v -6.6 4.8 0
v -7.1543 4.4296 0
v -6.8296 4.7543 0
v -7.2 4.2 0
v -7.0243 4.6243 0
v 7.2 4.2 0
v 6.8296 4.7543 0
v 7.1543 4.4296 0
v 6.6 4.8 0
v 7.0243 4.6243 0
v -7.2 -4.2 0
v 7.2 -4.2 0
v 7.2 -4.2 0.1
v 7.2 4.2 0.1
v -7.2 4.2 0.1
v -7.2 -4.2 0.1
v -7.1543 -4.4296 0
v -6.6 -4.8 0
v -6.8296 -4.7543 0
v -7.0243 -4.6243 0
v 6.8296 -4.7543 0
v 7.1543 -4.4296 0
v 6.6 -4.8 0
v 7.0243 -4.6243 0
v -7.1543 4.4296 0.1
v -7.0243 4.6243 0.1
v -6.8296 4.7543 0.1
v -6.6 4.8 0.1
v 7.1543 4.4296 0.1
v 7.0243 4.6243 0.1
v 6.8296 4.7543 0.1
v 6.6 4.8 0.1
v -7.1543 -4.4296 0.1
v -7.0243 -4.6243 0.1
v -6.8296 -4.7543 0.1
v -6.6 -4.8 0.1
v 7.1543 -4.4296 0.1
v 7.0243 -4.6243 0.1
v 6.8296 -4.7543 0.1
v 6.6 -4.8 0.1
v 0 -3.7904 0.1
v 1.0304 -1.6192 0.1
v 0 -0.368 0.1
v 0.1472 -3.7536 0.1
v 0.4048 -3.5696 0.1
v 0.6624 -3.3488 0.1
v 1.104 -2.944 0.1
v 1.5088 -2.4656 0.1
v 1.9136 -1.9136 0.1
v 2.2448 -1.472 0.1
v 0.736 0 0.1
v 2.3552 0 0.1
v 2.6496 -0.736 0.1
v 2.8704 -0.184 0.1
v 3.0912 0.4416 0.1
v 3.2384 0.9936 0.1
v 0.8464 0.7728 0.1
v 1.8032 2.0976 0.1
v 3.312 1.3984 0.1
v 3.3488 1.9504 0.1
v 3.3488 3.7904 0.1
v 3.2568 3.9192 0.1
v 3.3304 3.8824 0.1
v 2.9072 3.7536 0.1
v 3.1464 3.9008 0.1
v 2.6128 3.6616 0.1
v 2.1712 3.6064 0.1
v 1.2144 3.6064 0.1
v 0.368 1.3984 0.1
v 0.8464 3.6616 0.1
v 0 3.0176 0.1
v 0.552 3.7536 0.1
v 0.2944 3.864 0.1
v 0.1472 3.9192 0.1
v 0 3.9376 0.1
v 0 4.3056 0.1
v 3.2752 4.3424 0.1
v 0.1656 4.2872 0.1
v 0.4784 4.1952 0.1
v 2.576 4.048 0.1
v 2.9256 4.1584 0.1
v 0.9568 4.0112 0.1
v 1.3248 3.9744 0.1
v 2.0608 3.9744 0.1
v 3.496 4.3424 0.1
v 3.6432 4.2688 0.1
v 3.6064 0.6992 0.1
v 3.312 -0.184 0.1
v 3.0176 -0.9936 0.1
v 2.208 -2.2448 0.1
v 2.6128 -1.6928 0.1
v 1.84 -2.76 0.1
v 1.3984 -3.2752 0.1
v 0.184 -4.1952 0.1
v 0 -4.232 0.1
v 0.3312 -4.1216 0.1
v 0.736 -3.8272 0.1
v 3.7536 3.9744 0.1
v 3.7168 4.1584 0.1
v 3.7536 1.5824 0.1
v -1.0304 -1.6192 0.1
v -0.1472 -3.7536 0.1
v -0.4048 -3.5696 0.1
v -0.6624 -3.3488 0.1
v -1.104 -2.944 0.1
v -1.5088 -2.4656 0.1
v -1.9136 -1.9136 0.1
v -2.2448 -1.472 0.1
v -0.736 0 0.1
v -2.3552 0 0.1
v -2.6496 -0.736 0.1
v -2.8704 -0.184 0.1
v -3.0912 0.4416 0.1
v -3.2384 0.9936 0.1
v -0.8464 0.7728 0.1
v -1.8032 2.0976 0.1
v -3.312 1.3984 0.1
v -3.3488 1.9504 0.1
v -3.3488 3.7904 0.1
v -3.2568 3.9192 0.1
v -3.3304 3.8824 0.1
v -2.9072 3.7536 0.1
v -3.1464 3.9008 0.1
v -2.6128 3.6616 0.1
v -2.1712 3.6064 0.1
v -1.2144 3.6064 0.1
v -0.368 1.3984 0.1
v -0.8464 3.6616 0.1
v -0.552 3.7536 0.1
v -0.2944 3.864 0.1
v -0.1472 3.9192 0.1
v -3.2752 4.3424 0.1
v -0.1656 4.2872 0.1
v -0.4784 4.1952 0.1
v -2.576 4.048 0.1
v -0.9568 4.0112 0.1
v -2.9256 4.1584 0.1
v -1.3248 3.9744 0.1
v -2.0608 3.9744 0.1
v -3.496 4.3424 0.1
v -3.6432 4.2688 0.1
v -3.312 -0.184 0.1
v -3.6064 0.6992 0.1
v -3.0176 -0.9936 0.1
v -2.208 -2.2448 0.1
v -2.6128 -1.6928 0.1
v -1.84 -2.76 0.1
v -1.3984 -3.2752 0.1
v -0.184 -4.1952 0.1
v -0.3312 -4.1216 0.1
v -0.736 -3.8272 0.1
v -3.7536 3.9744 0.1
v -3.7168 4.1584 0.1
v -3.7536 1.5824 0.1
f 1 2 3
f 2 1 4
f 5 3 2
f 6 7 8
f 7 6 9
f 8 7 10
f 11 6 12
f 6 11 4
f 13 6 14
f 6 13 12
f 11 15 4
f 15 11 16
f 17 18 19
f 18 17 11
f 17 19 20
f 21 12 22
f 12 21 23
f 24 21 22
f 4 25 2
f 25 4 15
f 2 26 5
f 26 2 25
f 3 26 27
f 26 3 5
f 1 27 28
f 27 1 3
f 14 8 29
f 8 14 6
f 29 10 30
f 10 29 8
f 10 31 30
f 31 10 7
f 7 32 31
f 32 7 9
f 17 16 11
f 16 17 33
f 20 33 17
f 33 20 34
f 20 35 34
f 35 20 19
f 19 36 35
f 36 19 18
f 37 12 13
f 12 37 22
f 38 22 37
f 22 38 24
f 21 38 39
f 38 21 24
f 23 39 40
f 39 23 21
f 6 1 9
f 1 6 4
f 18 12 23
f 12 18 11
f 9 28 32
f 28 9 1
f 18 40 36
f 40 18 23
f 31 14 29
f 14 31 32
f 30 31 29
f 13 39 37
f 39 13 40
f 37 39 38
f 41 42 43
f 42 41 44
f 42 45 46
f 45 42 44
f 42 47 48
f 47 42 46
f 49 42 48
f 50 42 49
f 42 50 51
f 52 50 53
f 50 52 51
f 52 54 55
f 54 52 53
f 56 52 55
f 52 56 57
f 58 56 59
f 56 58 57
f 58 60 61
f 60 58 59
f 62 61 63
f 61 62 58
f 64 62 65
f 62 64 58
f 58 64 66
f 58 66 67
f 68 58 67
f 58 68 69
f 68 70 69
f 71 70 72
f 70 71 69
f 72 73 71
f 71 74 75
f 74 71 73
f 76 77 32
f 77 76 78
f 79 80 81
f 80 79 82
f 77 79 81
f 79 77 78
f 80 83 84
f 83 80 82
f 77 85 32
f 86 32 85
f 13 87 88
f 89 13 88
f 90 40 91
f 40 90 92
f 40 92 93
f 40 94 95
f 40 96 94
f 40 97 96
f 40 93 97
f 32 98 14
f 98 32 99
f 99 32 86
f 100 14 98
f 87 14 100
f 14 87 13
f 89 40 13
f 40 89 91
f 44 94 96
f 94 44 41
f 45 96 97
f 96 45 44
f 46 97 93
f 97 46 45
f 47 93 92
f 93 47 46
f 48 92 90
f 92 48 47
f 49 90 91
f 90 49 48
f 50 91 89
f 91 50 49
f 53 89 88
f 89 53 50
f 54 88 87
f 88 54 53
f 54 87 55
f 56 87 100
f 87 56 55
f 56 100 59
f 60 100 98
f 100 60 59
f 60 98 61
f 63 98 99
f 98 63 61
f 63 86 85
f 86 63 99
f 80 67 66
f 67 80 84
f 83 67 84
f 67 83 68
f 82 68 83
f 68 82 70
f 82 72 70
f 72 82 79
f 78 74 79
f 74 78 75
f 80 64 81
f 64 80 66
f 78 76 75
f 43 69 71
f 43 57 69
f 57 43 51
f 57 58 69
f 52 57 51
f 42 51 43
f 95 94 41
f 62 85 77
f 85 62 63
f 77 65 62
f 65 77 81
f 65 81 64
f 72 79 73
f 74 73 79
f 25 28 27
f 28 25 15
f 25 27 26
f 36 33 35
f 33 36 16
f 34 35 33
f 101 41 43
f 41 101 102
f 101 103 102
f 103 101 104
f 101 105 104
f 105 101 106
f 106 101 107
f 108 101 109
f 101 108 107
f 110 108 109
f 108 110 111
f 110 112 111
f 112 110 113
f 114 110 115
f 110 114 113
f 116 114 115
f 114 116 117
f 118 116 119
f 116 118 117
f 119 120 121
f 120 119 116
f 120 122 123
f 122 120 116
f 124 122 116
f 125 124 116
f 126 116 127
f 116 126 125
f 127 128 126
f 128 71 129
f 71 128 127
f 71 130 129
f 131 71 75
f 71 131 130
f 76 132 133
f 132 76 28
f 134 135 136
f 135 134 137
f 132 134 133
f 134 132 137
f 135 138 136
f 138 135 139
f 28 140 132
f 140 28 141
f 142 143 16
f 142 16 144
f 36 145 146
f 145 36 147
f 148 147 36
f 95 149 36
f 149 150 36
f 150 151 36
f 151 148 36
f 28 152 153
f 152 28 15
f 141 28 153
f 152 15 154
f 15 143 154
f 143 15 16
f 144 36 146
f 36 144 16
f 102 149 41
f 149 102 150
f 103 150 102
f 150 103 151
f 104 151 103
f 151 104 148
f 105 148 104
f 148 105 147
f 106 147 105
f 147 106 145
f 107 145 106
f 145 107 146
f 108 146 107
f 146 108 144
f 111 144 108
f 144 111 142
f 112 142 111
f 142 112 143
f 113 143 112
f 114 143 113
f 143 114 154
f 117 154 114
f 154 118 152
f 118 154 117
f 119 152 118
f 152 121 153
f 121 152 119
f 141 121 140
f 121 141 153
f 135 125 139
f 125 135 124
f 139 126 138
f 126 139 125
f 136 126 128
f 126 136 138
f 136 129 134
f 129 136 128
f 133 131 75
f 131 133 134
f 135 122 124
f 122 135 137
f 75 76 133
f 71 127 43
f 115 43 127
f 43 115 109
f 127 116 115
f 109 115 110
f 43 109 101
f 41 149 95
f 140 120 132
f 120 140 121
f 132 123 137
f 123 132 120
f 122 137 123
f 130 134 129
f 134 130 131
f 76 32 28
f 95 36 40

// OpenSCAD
// file: ../p/box3u12.scad
use <../lib.scad>
function ldraw_lib__box3u12() = [
// 0 Box with 3 Parallel Faces without Any Edges
// 0 Name: box3u12.dat
// 0 Author: J.C. Tchang [tchang]
// 0 !LDRAW_ORG Primitive UPDATE 2014-02
// 0 !LICENSE Licensed under CC BY 4.0 : see CAreadme.txt
// 
// 0 BFC CERTIFY CCW
  [0,"BFC","CERTIFY"],
  [0,"BFC","CCW"],
// 
// 0 !HISTORY 2014-12-23 [PTadmin] Official Update 2014-02
// 
// 
// 4 16 -1 1 1 1 1 1 1 1 -1 -1 1 -1
  [4,16,-1,1,1,1,1,1,1,1,-1,-1,1,-1],
// 4 16 -1 1 1 -1 0 1 1 0 1 1 1 1
  [4,16,-1,1,1,-1,0,1,1,0,1,1,1,1],
// 4 16 1 1 -1 1 0 -1 -1 0 -1 -1 1 -1
  [4,16,1,1,-1,1,0,-1,-1,0,-1,-1,1,-1],
];
module ldraw_lib__box3u12(step=0, col=false, unit=2/5, alt=false, line=0.2, solid=!$preview)
    makepoly(ldraw_lib__box3u12(), step=step, col=col, unit=unit, alt=alt, line=line, solid=solid);
ldraw_lib__box3u12(line=0.2);
// file: ../p/1-4cyli.scad
use <../lib.scad>
function ldraw_lib__1_4cyli() = [
// 0 Cylinder 0.25
// 0 Name: 1-4cyli.dat
// 0 Author: James Jessiman
// 0 !LDRAW_ORG Primitive UPDATE 2012-01
// 0 !LICENSE Licensed under CC BY 4.0 : see CAreadme.txt
// 
// 0 BFC CERTIFY CCW
  [0,"BFC","CERTIFY"],
  [0,"BFC","CCW"],
// 
// 0 !HISTORY 2002-03-23 [sbliss] Added BFC statement.
// 0 !HISTORY 2002-04-25 [PTadmin] Official Update 2002-02
// 0 !HISTORY 2007-06-22 [PTadmin] Header formatted for Contributor Agreement
// 0 !HISTORY 2008-07-01 [PTadmin] Official Update 2008-01
// 0 !HISTORY 2012-02-16 [Philo] Changed to CCW
// 0 !HISTORY 2012-03-30 [PTadmin] Official Update 2012-01
// 
// 
// 4 16 1 1 0 0.9239 1 0.3827 0.9239 0 0.3827 1 0 0
  [4,16,1,1,0,0.9239,1,0.3827,0.9239,0,0.3827,1,0,0],
// 5 24 1 0 0 1 1 0 0.9239 0 0.3827 1 0 -1
  [5,24,1,0,0,1,1,0,0.9239,0,0.3827,1,0,-1],
// 4 16 0.9239 1 0.3827 0.7071 1 0.7071 0.7071 0 0.7071 0.9239 0 0.3827
  [4,16,0.9239,1,0.3827,0.7071,1,0.7071,0.7071,0,0.7071,0.9239,0,0.3827],
// 5 24 0.9239 0 0.3827 0.9239 1 0.3827 0.7071 0 0.7071 1 0 0
  [5,24,0.9239,0,0.3827,0.9239,1,0.3827,0.7071,0,0.7071,1,0,0],
// 4 16 0.7071 1 0.7071 0.3827 1 0.9239 0.3827 0 0.9239 0.7071 0 0.7071
  [4,16,0.7071,1,0.7071,0.3827,1,0.9239,0.3827,0,0.9239,0.7071,0,0.7071],
// 5 24 0.7071 0 0.7071 0.7071 1 0.7071 0.3827 0 0.9239 0.9239 0 0.3827
  [5,24,0.7071,0,0.7071,0.7071,1,0.7071,0.3827,0,0.9239,0.9239,0,0.3827],
// 4 16 0.3827 1 0.9239 0 1 1 0 0 1 0.3827 0 0.9239
  [4,16,0.3827,1,0.9239,0,1,1,0,0,1,0.3827,0,0.9239],
// 5 24 0.3827 0 0.9239 0.3827 1 0.9239 0 0 1 0.7071 0 0.7071
  [5,24,0.3827,0,0.9239,0.3827,1,0.9239,0,0,1,0.7071,0,0.7071],
// 5 24 0 0 1 0 1 1 0.3827 0 0.9239 -1 0 1
  [5,24,0,0,1,0,1,1,0.3827,0,0.9239,-1,0,1],
];
module ldraw_lib__1_4cyli(step=0, col=false, unit=2/5, alt=false, line=0.2, solid=!$preview)
    makepoly(ldraw_lib__1_4cyli(), step=step, col=col, unit=unit, alt=alt, line=line, solid=solid);
ldraw_lib__1_4cyli(line=0.2);
// file: ../p/1-4chrd.scad
use <../lib.scad>
function ldraw_lib__1_4chrd() = [
// 0 Chord 0.25
// 0 Name: 1-4chrd.dat
// 0 Author: Max Martin Richter [MMR1988]
// 0 !LDRAW_ORG Primitive UPDATE 2023-05
// 0 !LICENSE Licensed under CC BY 4.0 : see CAreadme.txt
// 
// 0 BFC CERTIFY CCW
  [0,"BFC","CERTIFY"],
  [0,"BFC","CCW"],
// 
// 0 !HISTORY 2004-04-22 [PTadmin] Official Update 2004-02
// 0 !HISTORY 2007-10-09 [PTadmin] Header formatted for Contributor Agreement
// 0 !HISTORY 2008-07-01 [PTadmin] Official Update 2008-01
// 0 !HISTORY 2012-08-02 [MMR1988] Re-creation with PrimGen2 and Rectifier
// 0 !HISTORY 2012-08-09 [PTadmin] Official Update 2012-02
// 0 !HISTORY 2023-10-27 [OrionP] Change author to MMR1988 from hafhead
// 0 !HISTORY 2023-10-31 [OrionP] Official Update 2023-05
// 
// 4 16 0.9239 0 0.3827 0.3827 0 0.9239 0 0 1 1 0 0
  [4,16,0.9239,0,0.3827,0.3827,0,0.9239,0,0,1,1,0,0],
// 3 16 0.7071 0 0.7071 0.3827 0 0.9239 0.9239 0 0.3827
  [3,16,0.7071,0,0.7071,0.3827,0,0.9239,0.9239,0,0.3827],
];
module ldraw_lib__1_4chrd(step=0, col=false, unit=2/5, alt=false, line=0.2, solid=!$preview)
    makepoly(ldraw_lib__1_4chrd(), step=step, col=col, unit=unit, alt=alt, line=line, solid=solid);
ldraw_lib__1_4chrd(line=0.2);
// file: s/stickerback012x018.scad
use <../../lib.scad>
use <../../p/1-4chrd.scad>
use <../../p/1-4cyli.scad>
use <../../p/box3u12.scad>
function ldraw_lib__s__stickerback012x018() = [
// 0 ~Sticker Back  1.2 x  1.8
// 0 Name: s\stickerback012x018.dat
// 0 Author: Takeshi Takahashi [RainbowDolphin]
// 0 !LDRAW_ORG Subpart UPDATE 2025-11
// 0 !LICENSE Licensed under CC BY 4.0 : see CAreadme.txt
// 
// 0 BFC CERTIFY CCW
  [0,"BFC","CERTIFY"],
  [0,"BFC","CCW"],
// 
// 0 !HISTORY 2025-11-30 [OrionP] Official Update 2025-11
// 
// 0 // Primitives
// 1 16 -16.5 0 10.5 -1.5 0 0 0 -1 0 0 0 1.5 1-4chrd.dat
  [1,16,-16.5,0,10.5,-1.5,0,0,0,-1,0,0,0,1.5, ldraw_lib__1_4chrd()],
// 1 16 16.5 0 10.5 1.5 0 0 0 -1 0 0 0 1.5 1-4chrd.dat
  [1,16,16.5,0,10.5,1.5,0,0,0,-1,0,0,0,1.5, ldraw_lib__1_4chrd()],
// 1 16 0 -.25 0 0 0 18 0 .25 0 10.5 0 0 box3u12.dat
  [1,16,0,-.25,0,0,0,18,0,.25,0,10.5,0,0, ldraw_lib__box3u12()],
// 1 16 -16.5 0 -10.5 -1.5 0 0 0 -1 0 0 0 -1.5 1-4chrd.dat
  [1,16,-16.5,0,-10.5,-1.5,0,0,0,-1,0,0,0,-1.5, ldraw_lib__1_4chrd()],
// 1 16 16.5 0 -10.5 1.5 0 0 0 -1 0 0 0 -1.5 1-4chrd.dat
  [1,16,16.5,0,-10.5,1.5,0,0,0,-1,0,0,0,-1.5, ldraw_lib__1_4chrd()],
// 1 16 -16.5 0 10.5 -1.5 0 0 0 -.25 0 0 0 1.5 1-4cyli.dat
  [1,16,-16.5,0,10.5,-1.5,0,0,0,-.25,0,0,0,1.5, ldraw_lib__1_4cyli()],
// 1 16 16.5 0 10.5 1.5 0 0 0 -.25 0 0 0 1.5 1-4cyli.dat
  [1,16,16.5,0,10.5,1.5,0,0,0,-.25,0,0,0,1.5, ldraw_lib__1_4cyli()],
// 1 16 -16.5 0 -10.5 -1.5 0 0 0 -.25 0 0 0 -1.5 1-4cyli.dat
  [1,16,-16.5,0,-10.5,-1.5,0,0,0,-.25,0,0,0,-1.5, ldraw_lib__1_4cyli()],
// 1 16 16.5 0 -10.5 1.5 0 0 0 -.25 0 0 0 -1.5 1-4cyli.dat
  [1,16,16.5,0,-10.5,1.5,0,0,0,-.25,0,0,0,-1.5, ldraw_lib__1_4cyli()],
// 0 // Bottom face
// 4 16 -18 0 10.5 -16.5 0 12 16.5 0 12 18 0 10.5
  [4,16,-18,0,10.5,-16.5,0,12,16.5,0,12,18,0,10.5],
// 4 16 -18 0 -10.5 18 0 -10.5 16.5 0 -12 -16.5 0 -12
  [4,16,-18,0,-10.5,18,0,-10.5,16.5,0,-12,-16.5,0,-12],
// 0 // Lateral face
// 4 16 -16.5 0 12 -16.5 -.25 12 16.5 -.25 12 16.5 0 12
  [4,16,-16.5,0,12,-16.5,-.25,12,16.5,-.25,12,16.5,0,12],
// 4 16 -16.5 0 -12 16.5 0 -12 16.5 -.25 -12 -16.5 -.25 -12
  [4,16,-16.5,0,-12,16.5,0,-12,16.5,-.25,-12,-16.5,-.25,-12],
];
module ldraw_lib__s__stickerback012x018(step=0, col=false, unit=2/5, alt=false, line=0.2, solid=!$preview)
    makepoly(ldraw_lib__s__stickerback012x018(), step=step, col=col, unit=unit, alt=alt, line=line, solid=solid);
ldraw_lib__s__stickerback012x018(line=0.2);
// main file
use <../lib.scad>
use <s/4585631as01.scad>
use <s/stickerback012x018.scad>
function ldraw_lib__4585631a() = [
// 0 Sticker  1.2 x  1.8 with Maersk Logo on White Shield
// 0 Name: 4585631a.dat
// 0 Author: Evert-Jan Boer [ejboer]
// 0 !LDRAW_ORG Part UPDATE 2026-09
// 0 !LICENSE Licensed under CC BY 4.0 : see CAreadme.txt
// 
// 0 BFC CERTIFY CCW
  [0,"BFC","CERTIFY"],
  [0,"BFC","CCW"],
// 
// 0 !CATEGORY Sticker
// 0 !KEYWORDS Bricklink 10152.3stk03, Brickowl 683041, Container Ship
// 0 !KEYWORDS Rebrickable 57337, Set 10155
// 
// 0 !HISTORY 2026-04-21 [Sirio] Changed stickerback, changed description and adapted top face
// 0 !HISTORY 2026-09-30 [OrionP] Official Update 2026-09
// 
// 0 // Stickerback
// 1 16 0 0 0 1 0 0 0 1 0 0 0 1 s\stickerback012x018.dat
  [1,16,0,0,0,1,0,0,0,1,0,0,0,1, ldraw_lib__s__stickerback012x018()],
// 0 // Subparts
// 1 16 0 -.25 0 1 0 0 0 1 0 0 0 1 s\4585631as01.dat
  [1,16,0,-.25,0,1,0,0,0,1,0,0,0,1, ldraw_lib__s__4585631as01()],
// 1 16 0 -.25 0 -1 0 0 0 1 0 0 0 1 s\4585631as01.dat
  [1,16,0,-.25,0,-1,0,0,0,1,0,0,0,1, ldraw_lib__s__4585631as01()],
// 0 // Complementary faces
// 3 313 0 -.25 10.764 16.5 -.25 12 -16.5 -.25 12
  [3,313,0,-.25,10.764,16.5,-.25,12,-16.5,-.25,12],
// 3 313 0 -.25 -10.58 -16.5 -.25 -12 16.5 -.25 -12
  [3,313,0,-.25,-10.58,-16.5,-.25,-12,16.5,-.25,-12],
];
module ldraw_lib__4585631a(step=0, col=false, unit=2/5, alt=false, line=0.2, solid=!$preview)
    makepoly(ldraw_lib__4585631a(), step=step, col=col, unit=unit, alt=alt, line=line, solid=solid);
ldraw_lib__4585631a(line=0.2);
